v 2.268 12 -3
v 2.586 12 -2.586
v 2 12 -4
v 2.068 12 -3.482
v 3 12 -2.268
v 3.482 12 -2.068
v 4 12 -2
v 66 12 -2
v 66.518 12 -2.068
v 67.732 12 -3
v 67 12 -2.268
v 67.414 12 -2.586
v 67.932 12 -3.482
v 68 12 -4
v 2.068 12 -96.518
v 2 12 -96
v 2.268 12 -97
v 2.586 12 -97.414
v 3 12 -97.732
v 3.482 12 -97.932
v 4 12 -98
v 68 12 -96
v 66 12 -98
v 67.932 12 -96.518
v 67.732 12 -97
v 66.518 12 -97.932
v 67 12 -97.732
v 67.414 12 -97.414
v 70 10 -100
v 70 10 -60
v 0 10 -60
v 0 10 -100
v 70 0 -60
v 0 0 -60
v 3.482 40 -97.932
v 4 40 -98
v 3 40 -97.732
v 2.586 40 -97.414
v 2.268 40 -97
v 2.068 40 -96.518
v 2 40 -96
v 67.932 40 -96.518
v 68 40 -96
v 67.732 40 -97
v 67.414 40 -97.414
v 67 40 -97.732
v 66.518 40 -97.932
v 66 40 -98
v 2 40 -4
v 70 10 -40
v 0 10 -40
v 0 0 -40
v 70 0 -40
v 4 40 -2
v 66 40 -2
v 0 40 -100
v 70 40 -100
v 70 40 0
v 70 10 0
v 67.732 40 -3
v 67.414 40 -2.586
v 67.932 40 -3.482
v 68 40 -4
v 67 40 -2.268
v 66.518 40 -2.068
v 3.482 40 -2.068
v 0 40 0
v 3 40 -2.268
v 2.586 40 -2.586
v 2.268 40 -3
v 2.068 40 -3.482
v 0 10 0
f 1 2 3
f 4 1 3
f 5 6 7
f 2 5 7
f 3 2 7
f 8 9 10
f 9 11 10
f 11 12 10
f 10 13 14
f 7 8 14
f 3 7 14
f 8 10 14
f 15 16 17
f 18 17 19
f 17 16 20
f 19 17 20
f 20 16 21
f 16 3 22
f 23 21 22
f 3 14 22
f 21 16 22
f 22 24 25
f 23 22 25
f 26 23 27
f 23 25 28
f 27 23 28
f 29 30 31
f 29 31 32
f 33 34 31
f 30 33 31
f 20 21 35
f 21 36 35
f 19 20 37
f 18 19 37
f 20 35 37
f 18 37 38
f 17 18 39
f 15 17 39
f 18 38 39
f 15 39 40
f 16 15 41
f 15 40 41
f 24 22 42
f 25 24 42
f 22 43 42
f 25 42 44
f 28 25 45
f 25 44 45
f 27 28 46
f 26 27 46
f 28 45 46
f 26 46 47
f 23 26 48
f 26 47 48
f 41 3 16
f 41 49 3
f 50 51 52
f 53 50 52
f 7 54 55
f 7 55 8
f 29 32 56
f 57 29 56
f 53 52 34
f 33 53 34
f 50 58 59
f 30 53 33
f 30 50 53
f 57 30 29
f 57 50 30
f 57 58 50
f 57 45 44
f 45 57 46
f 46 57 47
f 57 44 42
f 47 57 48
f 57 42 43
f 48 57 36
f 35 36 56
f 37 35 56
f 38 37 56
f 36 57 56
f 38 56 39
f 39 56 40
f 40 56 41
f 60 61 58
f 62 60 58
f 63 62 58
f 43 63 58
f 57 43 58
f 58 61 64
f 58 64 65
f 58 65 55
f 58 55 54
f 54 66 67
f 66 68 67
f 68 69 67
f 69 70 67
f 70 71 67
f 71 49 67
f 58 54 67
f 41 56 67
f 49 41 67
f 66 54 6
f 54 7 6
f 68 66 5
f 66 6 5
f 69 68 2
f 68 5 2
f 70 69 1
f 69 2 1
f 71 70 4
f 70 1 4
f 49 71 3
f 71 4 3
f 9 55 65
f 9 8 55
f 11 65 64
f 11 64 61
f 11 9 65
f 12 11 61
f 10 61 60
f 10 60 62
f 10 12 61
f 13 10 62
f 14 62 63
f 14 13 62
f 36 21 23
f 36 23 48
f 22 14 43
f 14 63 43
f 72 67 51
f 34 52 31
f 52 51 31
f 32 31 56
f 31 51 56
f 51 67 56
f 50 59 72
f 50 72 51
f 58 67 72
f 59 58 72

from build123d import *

# Parameters (mm, degrees)
BOSS_EXTRUDE1_DEPTH        = 70
SHELL16_T                  = -2
SHELL16_THICKNESS_2_FACE_W = 16
SHELL16_THICKNESS_2_FACE_H = 66
SHELL16_THICKNESS_2_DEPTH  = 10
FILLET1_R                  = 2


with BuildPart() as part:
    # Sketch1 → Boss-Extrude1 (new body)
    with BuildSketch(Plane(origin=(0, 0, 0), x_dir=(0, 0, -1), z_dir=(1, 0, 0))):
        Polygon((40, 0), (60, 0), (60, 10), (100, 10), (100, 40), (0, 40), (0, 10), (40, 10), align=None)
    extrude(amount=BOSS_EXTRUDE1_DEPTH)

    # Shell16
    shell16_openings = [part.faces().sort_by_distance(p)[0] for p in [
        (35, 40, -50),
    ]]
    offset(amount=SHELL16_T, openings=shell16_openings, kind=Kind.INTERSECTION)

    # Shell16 thickness 2 face (on inner face of the shell) → Shell16 thickness 2 (add)
    with BuildSketch(Plane(origin=(35, 2, -50), x_dir=(0, 0, -1), z_dir=(0, -1, 0))):
        Rectangle(SHELL16_THICKNESS_2_FACE_W, SHELL16_THICKNESS_2_FACE_H)
    extrude(amount=-SHELL16_THICKNESS_2_DEPTH)

    # Fillet1
    fillet1_edges = [part.edges().sort_by_distance(p)[0] for p in [
        (2, 26, -98),
        (2, 26, -2),
        (68, 26, -98),
        (68, 26, -2),
    ]]
    fillet(fillet1_edges, radius=FILLET1_R)


solid = part.part
